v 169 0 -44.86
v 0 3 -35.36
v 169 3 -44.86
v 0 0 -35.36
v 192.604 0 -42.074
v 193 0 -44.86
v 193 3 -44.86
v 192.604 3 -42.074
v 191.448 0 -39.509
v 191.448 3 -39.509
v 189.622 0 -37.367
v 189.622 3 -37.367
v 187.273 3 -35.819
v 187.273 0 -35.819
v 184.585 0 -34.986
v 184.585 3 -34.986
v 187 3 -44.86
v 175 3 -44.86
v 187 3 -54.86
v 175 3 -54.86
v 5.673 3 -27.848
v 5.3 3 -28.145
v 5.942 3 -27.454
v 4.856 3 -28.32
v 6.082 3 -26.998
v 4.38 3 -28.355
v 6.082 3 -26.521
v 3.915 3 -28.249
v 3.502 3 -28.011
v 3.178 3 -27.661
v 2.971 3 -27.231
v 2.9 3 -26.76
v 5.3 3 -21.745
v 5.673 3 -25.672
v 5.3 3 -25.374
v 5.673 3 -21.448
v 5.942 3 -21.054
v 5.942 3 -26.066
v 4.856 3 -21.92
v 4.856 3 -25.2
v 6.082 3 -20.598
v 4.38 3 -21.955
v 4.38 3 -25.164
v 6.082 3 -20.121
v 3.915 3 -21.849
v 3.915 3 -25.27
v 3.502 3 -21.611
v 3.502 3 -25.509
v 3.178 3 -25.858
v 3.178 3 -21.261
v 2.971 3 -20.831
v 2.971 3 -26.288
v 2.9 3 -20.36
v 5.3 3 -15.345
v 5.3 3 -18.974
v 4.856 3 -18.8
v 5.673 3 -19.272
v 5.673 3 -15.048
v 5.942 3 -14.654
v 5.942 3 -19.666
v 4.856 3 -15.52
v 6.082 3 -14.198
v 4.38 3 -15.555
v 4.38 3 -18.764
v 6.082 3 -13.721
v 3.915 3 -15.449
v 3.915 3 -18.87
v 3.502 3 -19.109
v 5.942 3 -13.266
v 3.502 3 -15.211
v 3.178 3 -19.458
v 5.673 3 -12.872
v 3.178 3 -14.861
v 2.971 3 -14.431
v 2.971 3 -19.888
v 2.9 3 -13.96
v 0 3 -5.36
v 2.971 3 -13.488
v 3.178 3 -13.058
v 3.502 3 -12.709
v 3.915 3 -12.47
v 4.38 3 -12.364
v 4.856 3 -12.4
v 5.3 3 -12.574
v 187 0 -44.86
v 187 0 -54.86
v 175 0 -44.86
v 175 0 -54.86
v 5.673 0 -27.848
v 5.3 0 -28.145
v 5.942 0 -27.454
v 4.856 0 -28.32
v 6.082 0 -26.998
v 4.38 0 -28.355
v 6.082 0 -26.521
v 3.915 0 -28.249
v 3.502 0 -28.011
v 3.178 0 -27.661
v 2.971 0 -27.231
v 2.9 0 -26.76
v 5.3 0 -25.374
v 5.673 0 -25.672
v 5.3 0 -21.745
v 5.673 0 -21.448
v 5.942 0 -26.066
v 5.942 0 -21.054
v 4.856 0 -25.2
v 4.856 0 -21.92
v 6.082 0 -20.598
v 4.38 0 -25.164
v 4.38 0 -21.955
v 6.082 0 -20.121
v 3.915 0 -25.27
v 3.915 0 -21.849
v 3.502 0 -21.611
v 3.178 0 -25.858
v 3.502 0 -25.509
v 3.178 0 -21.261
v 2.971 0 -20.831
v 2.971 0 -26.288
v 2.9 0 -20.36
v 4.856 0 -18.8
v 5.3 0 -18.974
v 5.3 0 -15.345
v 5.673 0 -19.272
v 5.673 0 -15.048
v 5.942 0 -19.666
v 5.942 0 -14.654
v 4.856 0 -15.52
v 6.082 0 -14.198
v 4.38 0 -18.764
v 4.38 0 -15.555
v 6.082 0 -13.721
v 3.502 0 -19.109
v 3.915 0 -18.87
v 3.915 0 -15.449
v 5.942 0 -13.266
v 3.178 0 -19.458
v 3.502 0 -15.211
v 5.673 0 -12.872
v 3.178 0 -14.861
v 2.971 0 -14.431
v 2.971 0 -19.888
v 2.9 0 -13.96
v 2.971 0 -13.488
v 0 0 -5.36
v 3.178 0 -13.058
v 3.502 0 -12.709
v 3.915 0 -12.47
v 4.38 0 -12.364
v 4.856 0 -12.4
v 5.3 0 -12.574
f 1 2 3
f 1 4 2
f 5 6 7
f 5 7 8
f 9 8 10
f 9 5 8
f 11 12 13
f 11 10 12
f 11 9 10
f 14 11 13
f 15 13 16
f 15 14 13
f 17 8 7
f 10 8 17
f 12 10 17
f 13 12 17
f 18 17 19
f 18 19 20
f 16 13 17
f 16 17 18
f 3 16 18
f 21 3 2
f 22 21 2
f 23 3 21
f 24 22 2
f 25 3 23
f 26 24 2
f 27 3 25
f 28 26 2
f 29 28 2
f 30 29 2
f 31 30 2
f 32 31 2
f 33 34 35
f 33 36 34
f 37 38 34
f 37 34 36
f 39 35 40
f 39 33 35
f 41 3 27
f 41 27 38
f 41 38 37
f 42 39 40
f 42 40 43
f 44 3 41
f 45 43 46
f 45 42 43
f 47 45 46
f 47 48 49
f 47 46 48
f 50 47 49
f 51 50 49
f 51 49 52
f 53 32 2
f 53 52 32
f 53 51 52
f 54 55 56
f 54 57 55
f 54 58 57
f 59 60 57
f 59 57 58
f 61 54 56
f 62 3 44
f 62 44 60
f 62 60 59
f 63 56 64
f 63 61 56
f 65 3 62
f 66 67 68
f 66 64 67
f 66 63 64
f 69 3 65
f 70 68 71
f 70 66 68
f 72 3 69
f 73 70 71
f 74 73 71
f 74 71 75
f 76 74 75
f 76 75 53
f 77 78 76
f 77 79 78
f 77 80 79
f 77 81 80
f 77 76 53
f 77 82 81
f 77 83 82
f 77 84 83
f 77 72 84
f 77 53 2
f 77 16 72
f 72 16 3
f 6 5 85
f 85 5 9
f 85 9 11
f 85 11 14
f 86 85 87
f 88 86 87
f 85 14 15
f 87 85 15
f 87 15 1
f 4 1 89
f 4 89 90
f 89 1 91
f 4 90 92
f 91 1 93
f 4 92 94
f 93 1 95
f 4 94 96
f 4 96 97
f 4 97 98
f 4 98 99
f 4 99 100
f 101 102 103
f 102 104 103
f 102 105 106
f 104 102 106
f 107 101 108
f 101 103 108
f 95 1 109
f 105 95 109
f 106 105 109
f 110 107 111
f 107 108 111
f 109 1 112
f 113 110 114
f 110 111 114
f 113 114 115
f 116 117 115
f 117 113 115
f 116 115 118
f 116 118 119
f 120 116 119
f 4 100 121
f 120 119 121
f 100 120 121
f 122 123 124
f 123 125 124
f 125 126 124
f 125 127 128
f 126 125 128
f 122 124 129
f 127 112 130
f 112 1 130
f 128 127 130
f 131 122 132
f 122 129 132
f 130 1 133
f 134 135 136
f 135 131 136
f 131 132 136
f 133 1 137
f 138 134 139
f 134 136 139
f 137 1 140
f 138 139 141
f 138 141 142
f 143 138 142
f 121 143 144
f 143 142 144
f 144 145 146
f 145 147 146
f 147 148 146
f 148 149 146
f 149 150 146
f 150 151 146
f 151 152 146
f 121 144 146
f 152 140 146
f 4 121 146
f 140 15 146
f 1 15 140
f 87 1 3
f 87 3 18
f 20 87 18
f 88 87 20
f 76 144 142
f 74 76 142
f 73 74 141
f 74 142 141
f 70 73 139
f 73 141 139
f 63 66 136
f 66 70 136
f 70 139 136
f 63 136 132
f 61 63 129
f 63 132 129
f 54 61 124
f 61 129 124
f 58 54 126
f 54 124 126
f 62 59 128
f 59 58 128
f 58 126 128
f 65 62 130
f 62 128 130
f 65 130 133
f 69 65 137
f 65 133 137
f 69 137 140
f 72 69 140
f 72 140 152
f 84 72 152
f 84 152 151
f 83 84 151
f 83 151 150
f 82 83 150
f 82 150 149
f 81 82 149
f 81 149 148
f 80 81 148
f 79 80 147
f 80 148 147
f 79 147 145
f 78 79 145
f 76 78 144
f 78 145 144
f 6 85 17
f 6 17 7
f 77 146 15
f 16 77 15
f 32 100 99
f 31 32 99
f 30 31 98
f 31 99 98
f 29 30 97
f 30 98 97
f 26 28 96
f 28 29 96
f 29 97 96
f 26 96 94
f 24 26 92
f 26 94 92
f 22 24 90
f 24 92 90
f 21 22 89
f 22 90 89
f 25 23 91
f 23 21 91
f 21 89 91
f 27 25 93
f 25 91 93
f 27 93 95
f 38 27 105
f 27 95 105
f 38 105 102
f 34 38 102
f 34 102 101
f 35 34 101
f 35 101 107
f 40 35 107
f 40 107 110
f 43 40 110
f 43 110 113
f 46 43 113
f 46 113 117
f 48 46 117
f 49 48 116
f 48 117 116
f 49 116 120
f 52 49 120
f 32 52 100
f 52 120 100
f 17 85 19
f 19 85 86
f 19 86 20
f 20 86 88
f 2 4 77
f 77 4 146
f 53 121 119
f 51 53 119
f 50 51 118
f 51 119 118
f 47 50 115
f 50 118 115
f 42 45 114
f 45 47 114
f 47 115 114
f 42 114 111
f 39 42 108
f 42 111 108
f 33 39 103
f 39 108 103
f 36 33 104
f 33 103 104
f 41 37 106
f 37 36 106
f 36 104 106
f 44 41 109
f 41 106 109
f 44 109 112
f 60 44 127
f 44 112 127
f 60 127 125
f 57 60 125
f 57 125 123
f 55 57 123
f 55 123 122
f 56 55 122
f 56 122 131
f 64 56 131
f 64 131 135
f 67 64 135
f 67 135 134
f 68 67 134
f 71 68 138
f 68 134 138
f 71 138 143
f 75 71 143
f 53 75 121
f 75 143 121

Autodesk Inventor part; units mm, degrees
ref_plane "YZ Plane" through (0, 0, 0) normal (1, 0, 0) x (0, 1, 0)
ref_plane "XZ Plane" through (0, 0, 0) normal (0, 1, 0) x (-1, 0, 0)
ref_plane "XY Plane" through (0, 0, 0) normal (0, 0, 1) x (1, 0, 0)
sketch "スケッチ3" plane through (0, 0, 0) normal (0, 1, 0) x (-1, 0, 0)
  line L0 (0, -35.3598) -> (0, -5.3598)
  line L1 (-187, -44.8598) -> (-187, -54.8598) projected
  line L2 (-175, -44.8598) -> (-175, -54.8598) projected
  line L3 (0, -5.3598) -> (-184.5847, -34.9862)
  arc A0 (-184.5847, -34.9862) -> (-193, -44.8598) centre (-183, -44.8598) ccw
  line L4 (-187, -54.8598) -> (-175, -54.8598)
  line L5 (-187, -44.8598) -> (-193, -44.8598)
  line L6 (0, -35.3598) -> (-169, -44.8598)
  line L7 (-169, -44.8598) -> (-175, -44.8598)
  circle A1 centre (-4.5, -20.3598) radius 1.6 projected
  circle A2 centre (-4.5, -13.9598) radius 1.6
  circle A3 centre (-4.5, -26.7598) radius 1.6
  point P0 (0, -20.3598)
  dimension "d17" = 10
  dimension "d18" = 6
  dimension "d20" = 30
  dimension "d21" = 4.5
  dimension "d22" = 6.4
  dimension "d23" = 6.4
extrude "押し出し2" add sketch "スケッチ3" along normal blind 3
equation "\"d23\" = d22"
properties part number "SqPipe92" material "アクリル、クリア"
